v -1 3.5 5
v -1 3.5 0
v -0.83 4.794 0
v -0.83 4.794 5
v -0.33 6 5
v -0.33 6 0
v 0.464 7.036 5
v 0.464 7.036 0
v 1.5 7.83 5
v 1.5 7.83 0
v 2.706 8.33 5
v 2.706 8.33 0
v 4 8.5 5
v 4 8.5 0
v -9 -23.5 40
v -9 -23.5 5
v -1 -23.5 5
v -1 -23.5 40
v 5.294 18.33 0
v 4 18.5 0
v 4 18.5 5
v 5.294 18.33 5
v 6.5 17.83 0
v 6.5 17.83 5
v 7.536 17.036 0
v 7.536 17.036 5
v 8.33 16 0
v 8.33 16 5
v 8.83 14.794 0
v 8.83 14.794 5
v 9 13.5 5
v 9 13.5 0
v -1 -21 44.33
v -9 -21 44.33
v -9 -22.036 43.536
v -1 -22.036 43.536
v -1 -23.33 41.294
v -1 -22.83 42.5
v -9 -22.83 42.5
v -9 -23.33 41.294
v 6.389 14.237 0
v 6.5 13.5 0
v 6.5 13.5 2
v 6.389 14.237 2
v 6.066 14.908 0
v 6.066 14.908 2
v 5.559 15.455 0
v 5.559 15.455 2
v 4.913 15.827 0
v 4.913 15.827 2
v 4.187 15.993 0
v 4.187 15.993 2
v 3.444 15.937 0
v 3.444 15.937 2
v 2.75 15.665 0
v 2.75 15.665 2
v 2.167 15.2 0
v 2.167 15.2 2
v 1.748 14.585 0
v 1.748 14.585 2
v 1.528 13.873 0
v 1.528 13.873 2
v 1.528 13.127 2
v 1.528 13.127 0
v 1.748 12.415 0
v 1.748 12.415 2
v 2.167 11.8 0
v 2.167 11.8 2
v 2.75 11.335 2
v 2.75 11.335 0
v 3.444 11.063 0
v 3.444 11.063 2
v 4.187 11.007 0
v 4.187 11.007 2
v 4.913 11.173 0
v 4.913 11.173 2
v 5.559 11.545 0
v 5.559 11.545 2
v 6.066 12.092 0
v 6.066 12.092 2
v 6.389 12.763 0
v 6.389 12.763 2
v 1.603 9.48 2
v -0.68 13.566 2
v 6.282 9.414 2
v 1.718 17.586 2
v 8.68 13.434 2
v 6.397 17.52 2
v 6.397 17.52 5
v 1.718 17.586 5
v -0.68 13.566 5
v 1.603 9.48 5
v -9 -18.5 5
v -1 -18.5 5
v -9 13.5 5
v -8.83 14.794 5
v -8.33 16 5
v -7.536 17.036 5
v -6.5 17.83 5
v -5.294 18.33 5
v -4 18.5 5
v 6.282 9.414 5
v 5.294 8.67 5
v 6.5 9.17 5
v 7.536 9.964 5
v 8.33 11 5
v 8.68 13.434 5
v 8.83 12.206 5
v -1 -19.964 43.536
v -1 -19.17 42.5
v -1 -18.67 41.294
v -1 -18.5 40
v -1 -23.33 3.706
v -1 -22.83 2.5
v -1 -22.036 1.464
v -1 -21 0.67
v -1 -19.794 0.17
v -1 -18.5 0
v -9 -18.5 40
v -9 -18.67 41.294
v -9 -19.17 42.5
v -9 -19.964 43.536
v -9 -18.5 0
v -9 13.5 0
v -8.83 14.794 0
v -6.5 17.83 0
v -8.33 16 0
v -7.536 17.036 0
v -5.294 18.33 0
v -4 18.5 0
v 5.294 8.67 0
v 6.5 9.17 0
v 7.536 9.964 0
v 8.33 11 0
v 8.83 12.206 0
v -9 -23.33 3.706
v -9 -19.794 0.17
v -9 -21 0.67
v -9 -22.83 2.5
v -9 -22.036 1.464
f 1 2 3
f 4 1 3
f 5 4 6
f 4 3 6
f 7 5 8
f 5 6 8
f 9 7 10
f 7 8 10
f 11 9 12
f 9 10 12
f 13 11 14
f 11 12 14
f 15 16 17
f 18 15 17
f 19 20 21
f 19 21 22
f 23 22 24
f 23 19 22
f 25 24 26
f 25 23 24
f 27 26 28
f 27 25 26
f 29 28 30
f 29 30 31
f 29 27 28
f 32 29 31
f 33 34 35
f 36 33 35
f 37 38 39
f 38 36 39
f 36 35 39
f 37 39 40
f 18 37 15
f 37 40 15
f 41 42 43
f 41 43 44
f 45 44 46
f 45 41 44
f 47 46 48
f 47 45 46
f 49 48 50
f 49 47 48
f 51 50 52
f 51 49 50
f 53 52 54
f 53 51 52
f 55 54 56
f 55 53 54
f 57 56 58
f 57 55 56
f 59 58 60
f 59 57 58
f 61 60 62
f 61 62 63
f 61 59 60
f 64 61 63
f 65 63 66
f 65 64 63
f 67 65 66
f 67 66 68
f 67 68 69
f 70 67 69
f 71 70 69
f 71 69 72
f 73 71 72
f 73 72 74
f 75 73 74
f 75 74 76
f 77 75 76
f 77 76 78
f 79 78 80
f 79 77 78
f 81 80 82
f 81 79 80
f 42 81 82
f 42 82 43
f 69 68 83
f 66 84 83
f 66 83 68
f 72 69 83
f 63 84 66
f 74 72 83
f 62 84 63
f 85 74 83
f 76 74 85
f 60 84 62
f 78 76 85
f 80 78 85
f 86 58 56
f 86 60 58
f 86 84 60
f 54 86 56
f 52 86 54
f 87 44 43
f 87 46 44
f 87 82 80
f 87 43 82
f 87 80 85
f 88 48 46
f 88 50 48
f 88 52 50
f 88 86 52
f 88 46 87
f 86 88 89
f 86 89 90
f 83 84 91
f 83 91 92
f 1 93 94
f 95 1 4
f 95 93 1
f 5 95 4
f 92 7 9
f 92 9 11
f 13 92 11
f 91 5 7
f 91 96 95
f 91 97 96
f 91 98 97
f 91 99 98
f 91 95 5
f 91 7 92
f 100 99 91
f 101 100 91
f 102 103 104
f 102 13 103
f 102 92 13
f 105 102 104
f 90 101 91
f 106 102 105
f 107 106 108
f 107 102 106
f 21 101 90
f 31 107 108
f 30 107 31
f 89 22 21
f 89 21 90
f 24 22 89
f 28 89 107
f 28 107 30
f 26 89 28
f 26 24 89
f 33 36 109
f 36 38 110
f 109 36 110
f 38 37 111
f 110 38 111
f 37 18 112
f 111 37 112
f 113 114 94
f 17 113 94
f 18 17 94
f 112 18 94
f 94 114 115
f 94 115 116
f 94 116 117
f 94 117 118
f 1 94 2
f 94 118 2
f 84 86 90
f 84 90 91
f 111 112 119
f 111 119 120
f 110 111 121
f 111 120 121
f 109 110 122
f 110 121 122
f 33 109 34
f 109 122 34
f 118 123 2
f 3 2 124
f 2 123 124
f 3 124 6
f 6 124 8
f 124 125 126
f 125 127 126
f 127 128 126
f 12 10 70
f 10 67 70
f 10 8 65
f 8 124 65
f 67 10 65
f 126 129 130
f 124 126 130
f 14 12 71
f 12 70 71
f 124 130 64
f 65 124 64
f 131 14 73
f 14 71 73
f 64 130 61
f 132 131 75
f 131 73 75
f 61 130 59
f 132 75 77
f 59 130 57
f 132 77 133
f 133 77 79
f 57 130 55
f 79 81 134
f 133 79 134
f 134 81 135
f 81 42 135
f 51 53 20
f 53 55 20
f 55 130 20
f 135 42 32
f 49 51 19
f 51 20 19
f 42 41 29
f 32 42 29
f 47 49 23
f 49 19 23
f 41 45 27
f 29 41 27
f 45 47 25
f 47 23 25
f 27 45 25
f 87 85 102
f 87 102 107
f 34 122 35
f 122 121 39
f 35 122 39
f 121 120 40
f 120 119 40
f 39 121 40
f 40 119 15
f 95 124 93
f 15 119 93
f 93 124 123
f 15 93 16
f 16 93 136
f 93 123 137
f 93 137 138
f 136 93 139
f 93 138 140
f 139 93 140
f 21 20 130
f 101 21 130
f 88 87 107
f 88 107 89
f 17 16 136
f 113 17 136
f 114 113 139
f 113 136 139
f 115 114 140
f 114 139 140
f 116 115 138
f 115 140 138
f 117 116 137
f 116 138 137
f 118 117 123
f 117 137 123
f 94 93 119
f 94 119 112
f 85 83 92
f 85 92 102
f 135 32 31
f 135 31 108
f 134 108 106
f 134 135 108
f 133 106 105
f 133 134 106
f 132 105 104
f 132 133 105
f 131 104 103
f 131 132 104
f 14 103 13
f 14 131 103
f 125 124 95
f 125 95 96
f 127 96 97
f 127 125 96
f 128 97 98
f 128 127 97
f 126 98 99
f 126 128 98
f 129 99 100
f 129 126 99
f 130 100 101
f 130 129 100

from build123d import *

# Parameters (mm, degrees)
F0_W        = 8
F0_H        = 5
F1_DEPTH    = 45
F0_R        = 2.5
F2_DEPTH    = 5
F3_DEPTH    = 10
F4_DEPTH    = 2
F5_T1_DEPTH = 5
F5_T3_DEPTH = 30
F5_T5_DEPTH = 33


# Not quite as in the source:
# - a fillet or chamfer that OpenCascade refuses, or shapes differently, is made with other operations: its cross-section is extruded or revolved along the edge and cut away or added


with BuildPart() as f1:
    # F0 (on Top) → F1 (new body)
    with BuildSketch(Plane.XY):
        with Locations((-5, -21)):
            Rectangle(F0_W, F0_H)
    extrude(amount=F1_DEPTH)

    # F0 (on Top) → F2 (join)
    with BuildSketch(Plane.XY):
        Polygon((9, 18.5), (-9, 18.5), (-9, -18.5), (-1, -18.5), (-1, 8.5), (9, 8.5), align=None)
        Polygon((1.6027649533, 9.4804546863), (-0.6796458767, 13.5662937924), (1.71758917, 17.5858391061), (6.3972350467, 17.5195453137), (8.6796458767, 13.4337062076), (6.28241083, 9.4141608939), align=None, mode=Mode.SUBTRACT)
        Polygon((1.71758917, 17.5858391061), (-0.6796458767, 13.5662937924), (1.6027649533, 9.4804546863), (6.28241083, 9.4141608939), (8.6796458767, 13.4337062076), (6.3972350467, 17.5195453137), align=None)
        with Locations((4, 13.5)):
            Circle(F0_R, mode=Mode.SUBTRACT)
    extrude(amount=F2_DEPTH)

    # F0 (on Top) → F3 (cut)
    with BuildSketch(Plane.XY):
        Polygon((1.71758917, 17.5858391061), (-0.6796458767, 13.5662937924), (1.6027649533, 9.4804546863), (6.28241083, 9.4141608939), (8.6796458767, 13.4337062076), (6.3972350467, 17.5195453137), align=None)
        with Locations((4, 13.5)):
            Circle(F0_R, mode=Mode.SUBTRACT)
    extrude(amount=F3_DEPTH, mode=Mode.SUBTRACT)

    # F0 (on Top) → F4 (join)
    with BuildSketch(Plane.XY):
        Polygon((1.71758917, 17.5858391061), (-0.6796458767, 13.5662937924), (1.6027649533, 9.4804546863), (6.28241083, 9.4141608939), (8.6796458767, 13.4337062076), (6.3972350467, 17.5195453137), align=None)
        with Locations((4, 13.5)):
            Circle(F0_R, mode=Mode.SUBTRACT)
    extrude(amount=F4_DEPTH)

    # F5: fillet of radius 5 on 7 edges, made by hand

    # F5_s2 → F5_t1 (join)
    with BuildSketch(Plane.XY):
        with BuildLine():
            ThreePointArc((-1, 3.5), (0.4644660941, 7.0355339059), (4, 8.5))
            Line((4, 8.5), (-1, 8.5))
            Line((-1, 8.5), (-1, 3.5))
        make_face()
    extrude(amount=F5_T1_DEPTH)

    # F5_s4 → F5_t3 (cut)
    with BuildSketch(Plane.XY.offset(-12.5)):
        with BuildLine():
            ThreePointArc((-9, 13.5), (-7.5355339059, 17.0355339059), (-4, 18.5))
            Line((-4, 18.5), (-9, 18.5))
            Line((-9, 18.5), (-9, 13.5))
        make_face()
        with BuildLine():
            ThreePointArc((4, 18.5), (7.5355339059, 17.0355339059), (9, 13.5))
            Line((9, 13.5), (9, 18.5))
            Line((9, 18.5), (4, 18.5))
        make_face()
        with BuildLine():
            ThreePointArc((9, 13.5), (7.5355339059, 9.9644660941), (4, 8.5))
            Line((4, 8.5), (9, 8.5))
            Line((9, 8.5), (9, 13.5))
        make_face()
    extrude(amount=F5_T3_DEPTH, mode=Mode.SUBTRACT)

    # F5_s6 → F5_t5 (cut)
    with BuildSketch(Plane.YZ.offset(-21.5)):
        with BuildLine():
            ThreePointArc((-23.5, 5), (-22.0355339059, 1.4644660941), (-18.5, 0))
            Line((-18.5, 0), (-23.5, 0))
            Line((-23.5, 0), (-23.5, 5))
        make_face()
        with BuildLine():
            ThreePointArc((-18.5, 45), (-22.0355339059, 43.5355339059), (-23.5, 40))
            Line((-23.5, 40), (-23.5, 45))
            Line((-23.5, 45), (-18.5, 45))
        make_face()
        with BuildLine():
            ThreePointArc((-18.5, 40), (-19.9644660941, 43.5355339059), (-23.5, 45))
            Line((-23.5, 45), (-18.5, 45))
            Line((-18.5, 45), (-18.5, 40))
        make_face()
    extrude(amount=F5_T5_DEPTH, mode=Mode.SUBTRACT)


solid = f1.part
